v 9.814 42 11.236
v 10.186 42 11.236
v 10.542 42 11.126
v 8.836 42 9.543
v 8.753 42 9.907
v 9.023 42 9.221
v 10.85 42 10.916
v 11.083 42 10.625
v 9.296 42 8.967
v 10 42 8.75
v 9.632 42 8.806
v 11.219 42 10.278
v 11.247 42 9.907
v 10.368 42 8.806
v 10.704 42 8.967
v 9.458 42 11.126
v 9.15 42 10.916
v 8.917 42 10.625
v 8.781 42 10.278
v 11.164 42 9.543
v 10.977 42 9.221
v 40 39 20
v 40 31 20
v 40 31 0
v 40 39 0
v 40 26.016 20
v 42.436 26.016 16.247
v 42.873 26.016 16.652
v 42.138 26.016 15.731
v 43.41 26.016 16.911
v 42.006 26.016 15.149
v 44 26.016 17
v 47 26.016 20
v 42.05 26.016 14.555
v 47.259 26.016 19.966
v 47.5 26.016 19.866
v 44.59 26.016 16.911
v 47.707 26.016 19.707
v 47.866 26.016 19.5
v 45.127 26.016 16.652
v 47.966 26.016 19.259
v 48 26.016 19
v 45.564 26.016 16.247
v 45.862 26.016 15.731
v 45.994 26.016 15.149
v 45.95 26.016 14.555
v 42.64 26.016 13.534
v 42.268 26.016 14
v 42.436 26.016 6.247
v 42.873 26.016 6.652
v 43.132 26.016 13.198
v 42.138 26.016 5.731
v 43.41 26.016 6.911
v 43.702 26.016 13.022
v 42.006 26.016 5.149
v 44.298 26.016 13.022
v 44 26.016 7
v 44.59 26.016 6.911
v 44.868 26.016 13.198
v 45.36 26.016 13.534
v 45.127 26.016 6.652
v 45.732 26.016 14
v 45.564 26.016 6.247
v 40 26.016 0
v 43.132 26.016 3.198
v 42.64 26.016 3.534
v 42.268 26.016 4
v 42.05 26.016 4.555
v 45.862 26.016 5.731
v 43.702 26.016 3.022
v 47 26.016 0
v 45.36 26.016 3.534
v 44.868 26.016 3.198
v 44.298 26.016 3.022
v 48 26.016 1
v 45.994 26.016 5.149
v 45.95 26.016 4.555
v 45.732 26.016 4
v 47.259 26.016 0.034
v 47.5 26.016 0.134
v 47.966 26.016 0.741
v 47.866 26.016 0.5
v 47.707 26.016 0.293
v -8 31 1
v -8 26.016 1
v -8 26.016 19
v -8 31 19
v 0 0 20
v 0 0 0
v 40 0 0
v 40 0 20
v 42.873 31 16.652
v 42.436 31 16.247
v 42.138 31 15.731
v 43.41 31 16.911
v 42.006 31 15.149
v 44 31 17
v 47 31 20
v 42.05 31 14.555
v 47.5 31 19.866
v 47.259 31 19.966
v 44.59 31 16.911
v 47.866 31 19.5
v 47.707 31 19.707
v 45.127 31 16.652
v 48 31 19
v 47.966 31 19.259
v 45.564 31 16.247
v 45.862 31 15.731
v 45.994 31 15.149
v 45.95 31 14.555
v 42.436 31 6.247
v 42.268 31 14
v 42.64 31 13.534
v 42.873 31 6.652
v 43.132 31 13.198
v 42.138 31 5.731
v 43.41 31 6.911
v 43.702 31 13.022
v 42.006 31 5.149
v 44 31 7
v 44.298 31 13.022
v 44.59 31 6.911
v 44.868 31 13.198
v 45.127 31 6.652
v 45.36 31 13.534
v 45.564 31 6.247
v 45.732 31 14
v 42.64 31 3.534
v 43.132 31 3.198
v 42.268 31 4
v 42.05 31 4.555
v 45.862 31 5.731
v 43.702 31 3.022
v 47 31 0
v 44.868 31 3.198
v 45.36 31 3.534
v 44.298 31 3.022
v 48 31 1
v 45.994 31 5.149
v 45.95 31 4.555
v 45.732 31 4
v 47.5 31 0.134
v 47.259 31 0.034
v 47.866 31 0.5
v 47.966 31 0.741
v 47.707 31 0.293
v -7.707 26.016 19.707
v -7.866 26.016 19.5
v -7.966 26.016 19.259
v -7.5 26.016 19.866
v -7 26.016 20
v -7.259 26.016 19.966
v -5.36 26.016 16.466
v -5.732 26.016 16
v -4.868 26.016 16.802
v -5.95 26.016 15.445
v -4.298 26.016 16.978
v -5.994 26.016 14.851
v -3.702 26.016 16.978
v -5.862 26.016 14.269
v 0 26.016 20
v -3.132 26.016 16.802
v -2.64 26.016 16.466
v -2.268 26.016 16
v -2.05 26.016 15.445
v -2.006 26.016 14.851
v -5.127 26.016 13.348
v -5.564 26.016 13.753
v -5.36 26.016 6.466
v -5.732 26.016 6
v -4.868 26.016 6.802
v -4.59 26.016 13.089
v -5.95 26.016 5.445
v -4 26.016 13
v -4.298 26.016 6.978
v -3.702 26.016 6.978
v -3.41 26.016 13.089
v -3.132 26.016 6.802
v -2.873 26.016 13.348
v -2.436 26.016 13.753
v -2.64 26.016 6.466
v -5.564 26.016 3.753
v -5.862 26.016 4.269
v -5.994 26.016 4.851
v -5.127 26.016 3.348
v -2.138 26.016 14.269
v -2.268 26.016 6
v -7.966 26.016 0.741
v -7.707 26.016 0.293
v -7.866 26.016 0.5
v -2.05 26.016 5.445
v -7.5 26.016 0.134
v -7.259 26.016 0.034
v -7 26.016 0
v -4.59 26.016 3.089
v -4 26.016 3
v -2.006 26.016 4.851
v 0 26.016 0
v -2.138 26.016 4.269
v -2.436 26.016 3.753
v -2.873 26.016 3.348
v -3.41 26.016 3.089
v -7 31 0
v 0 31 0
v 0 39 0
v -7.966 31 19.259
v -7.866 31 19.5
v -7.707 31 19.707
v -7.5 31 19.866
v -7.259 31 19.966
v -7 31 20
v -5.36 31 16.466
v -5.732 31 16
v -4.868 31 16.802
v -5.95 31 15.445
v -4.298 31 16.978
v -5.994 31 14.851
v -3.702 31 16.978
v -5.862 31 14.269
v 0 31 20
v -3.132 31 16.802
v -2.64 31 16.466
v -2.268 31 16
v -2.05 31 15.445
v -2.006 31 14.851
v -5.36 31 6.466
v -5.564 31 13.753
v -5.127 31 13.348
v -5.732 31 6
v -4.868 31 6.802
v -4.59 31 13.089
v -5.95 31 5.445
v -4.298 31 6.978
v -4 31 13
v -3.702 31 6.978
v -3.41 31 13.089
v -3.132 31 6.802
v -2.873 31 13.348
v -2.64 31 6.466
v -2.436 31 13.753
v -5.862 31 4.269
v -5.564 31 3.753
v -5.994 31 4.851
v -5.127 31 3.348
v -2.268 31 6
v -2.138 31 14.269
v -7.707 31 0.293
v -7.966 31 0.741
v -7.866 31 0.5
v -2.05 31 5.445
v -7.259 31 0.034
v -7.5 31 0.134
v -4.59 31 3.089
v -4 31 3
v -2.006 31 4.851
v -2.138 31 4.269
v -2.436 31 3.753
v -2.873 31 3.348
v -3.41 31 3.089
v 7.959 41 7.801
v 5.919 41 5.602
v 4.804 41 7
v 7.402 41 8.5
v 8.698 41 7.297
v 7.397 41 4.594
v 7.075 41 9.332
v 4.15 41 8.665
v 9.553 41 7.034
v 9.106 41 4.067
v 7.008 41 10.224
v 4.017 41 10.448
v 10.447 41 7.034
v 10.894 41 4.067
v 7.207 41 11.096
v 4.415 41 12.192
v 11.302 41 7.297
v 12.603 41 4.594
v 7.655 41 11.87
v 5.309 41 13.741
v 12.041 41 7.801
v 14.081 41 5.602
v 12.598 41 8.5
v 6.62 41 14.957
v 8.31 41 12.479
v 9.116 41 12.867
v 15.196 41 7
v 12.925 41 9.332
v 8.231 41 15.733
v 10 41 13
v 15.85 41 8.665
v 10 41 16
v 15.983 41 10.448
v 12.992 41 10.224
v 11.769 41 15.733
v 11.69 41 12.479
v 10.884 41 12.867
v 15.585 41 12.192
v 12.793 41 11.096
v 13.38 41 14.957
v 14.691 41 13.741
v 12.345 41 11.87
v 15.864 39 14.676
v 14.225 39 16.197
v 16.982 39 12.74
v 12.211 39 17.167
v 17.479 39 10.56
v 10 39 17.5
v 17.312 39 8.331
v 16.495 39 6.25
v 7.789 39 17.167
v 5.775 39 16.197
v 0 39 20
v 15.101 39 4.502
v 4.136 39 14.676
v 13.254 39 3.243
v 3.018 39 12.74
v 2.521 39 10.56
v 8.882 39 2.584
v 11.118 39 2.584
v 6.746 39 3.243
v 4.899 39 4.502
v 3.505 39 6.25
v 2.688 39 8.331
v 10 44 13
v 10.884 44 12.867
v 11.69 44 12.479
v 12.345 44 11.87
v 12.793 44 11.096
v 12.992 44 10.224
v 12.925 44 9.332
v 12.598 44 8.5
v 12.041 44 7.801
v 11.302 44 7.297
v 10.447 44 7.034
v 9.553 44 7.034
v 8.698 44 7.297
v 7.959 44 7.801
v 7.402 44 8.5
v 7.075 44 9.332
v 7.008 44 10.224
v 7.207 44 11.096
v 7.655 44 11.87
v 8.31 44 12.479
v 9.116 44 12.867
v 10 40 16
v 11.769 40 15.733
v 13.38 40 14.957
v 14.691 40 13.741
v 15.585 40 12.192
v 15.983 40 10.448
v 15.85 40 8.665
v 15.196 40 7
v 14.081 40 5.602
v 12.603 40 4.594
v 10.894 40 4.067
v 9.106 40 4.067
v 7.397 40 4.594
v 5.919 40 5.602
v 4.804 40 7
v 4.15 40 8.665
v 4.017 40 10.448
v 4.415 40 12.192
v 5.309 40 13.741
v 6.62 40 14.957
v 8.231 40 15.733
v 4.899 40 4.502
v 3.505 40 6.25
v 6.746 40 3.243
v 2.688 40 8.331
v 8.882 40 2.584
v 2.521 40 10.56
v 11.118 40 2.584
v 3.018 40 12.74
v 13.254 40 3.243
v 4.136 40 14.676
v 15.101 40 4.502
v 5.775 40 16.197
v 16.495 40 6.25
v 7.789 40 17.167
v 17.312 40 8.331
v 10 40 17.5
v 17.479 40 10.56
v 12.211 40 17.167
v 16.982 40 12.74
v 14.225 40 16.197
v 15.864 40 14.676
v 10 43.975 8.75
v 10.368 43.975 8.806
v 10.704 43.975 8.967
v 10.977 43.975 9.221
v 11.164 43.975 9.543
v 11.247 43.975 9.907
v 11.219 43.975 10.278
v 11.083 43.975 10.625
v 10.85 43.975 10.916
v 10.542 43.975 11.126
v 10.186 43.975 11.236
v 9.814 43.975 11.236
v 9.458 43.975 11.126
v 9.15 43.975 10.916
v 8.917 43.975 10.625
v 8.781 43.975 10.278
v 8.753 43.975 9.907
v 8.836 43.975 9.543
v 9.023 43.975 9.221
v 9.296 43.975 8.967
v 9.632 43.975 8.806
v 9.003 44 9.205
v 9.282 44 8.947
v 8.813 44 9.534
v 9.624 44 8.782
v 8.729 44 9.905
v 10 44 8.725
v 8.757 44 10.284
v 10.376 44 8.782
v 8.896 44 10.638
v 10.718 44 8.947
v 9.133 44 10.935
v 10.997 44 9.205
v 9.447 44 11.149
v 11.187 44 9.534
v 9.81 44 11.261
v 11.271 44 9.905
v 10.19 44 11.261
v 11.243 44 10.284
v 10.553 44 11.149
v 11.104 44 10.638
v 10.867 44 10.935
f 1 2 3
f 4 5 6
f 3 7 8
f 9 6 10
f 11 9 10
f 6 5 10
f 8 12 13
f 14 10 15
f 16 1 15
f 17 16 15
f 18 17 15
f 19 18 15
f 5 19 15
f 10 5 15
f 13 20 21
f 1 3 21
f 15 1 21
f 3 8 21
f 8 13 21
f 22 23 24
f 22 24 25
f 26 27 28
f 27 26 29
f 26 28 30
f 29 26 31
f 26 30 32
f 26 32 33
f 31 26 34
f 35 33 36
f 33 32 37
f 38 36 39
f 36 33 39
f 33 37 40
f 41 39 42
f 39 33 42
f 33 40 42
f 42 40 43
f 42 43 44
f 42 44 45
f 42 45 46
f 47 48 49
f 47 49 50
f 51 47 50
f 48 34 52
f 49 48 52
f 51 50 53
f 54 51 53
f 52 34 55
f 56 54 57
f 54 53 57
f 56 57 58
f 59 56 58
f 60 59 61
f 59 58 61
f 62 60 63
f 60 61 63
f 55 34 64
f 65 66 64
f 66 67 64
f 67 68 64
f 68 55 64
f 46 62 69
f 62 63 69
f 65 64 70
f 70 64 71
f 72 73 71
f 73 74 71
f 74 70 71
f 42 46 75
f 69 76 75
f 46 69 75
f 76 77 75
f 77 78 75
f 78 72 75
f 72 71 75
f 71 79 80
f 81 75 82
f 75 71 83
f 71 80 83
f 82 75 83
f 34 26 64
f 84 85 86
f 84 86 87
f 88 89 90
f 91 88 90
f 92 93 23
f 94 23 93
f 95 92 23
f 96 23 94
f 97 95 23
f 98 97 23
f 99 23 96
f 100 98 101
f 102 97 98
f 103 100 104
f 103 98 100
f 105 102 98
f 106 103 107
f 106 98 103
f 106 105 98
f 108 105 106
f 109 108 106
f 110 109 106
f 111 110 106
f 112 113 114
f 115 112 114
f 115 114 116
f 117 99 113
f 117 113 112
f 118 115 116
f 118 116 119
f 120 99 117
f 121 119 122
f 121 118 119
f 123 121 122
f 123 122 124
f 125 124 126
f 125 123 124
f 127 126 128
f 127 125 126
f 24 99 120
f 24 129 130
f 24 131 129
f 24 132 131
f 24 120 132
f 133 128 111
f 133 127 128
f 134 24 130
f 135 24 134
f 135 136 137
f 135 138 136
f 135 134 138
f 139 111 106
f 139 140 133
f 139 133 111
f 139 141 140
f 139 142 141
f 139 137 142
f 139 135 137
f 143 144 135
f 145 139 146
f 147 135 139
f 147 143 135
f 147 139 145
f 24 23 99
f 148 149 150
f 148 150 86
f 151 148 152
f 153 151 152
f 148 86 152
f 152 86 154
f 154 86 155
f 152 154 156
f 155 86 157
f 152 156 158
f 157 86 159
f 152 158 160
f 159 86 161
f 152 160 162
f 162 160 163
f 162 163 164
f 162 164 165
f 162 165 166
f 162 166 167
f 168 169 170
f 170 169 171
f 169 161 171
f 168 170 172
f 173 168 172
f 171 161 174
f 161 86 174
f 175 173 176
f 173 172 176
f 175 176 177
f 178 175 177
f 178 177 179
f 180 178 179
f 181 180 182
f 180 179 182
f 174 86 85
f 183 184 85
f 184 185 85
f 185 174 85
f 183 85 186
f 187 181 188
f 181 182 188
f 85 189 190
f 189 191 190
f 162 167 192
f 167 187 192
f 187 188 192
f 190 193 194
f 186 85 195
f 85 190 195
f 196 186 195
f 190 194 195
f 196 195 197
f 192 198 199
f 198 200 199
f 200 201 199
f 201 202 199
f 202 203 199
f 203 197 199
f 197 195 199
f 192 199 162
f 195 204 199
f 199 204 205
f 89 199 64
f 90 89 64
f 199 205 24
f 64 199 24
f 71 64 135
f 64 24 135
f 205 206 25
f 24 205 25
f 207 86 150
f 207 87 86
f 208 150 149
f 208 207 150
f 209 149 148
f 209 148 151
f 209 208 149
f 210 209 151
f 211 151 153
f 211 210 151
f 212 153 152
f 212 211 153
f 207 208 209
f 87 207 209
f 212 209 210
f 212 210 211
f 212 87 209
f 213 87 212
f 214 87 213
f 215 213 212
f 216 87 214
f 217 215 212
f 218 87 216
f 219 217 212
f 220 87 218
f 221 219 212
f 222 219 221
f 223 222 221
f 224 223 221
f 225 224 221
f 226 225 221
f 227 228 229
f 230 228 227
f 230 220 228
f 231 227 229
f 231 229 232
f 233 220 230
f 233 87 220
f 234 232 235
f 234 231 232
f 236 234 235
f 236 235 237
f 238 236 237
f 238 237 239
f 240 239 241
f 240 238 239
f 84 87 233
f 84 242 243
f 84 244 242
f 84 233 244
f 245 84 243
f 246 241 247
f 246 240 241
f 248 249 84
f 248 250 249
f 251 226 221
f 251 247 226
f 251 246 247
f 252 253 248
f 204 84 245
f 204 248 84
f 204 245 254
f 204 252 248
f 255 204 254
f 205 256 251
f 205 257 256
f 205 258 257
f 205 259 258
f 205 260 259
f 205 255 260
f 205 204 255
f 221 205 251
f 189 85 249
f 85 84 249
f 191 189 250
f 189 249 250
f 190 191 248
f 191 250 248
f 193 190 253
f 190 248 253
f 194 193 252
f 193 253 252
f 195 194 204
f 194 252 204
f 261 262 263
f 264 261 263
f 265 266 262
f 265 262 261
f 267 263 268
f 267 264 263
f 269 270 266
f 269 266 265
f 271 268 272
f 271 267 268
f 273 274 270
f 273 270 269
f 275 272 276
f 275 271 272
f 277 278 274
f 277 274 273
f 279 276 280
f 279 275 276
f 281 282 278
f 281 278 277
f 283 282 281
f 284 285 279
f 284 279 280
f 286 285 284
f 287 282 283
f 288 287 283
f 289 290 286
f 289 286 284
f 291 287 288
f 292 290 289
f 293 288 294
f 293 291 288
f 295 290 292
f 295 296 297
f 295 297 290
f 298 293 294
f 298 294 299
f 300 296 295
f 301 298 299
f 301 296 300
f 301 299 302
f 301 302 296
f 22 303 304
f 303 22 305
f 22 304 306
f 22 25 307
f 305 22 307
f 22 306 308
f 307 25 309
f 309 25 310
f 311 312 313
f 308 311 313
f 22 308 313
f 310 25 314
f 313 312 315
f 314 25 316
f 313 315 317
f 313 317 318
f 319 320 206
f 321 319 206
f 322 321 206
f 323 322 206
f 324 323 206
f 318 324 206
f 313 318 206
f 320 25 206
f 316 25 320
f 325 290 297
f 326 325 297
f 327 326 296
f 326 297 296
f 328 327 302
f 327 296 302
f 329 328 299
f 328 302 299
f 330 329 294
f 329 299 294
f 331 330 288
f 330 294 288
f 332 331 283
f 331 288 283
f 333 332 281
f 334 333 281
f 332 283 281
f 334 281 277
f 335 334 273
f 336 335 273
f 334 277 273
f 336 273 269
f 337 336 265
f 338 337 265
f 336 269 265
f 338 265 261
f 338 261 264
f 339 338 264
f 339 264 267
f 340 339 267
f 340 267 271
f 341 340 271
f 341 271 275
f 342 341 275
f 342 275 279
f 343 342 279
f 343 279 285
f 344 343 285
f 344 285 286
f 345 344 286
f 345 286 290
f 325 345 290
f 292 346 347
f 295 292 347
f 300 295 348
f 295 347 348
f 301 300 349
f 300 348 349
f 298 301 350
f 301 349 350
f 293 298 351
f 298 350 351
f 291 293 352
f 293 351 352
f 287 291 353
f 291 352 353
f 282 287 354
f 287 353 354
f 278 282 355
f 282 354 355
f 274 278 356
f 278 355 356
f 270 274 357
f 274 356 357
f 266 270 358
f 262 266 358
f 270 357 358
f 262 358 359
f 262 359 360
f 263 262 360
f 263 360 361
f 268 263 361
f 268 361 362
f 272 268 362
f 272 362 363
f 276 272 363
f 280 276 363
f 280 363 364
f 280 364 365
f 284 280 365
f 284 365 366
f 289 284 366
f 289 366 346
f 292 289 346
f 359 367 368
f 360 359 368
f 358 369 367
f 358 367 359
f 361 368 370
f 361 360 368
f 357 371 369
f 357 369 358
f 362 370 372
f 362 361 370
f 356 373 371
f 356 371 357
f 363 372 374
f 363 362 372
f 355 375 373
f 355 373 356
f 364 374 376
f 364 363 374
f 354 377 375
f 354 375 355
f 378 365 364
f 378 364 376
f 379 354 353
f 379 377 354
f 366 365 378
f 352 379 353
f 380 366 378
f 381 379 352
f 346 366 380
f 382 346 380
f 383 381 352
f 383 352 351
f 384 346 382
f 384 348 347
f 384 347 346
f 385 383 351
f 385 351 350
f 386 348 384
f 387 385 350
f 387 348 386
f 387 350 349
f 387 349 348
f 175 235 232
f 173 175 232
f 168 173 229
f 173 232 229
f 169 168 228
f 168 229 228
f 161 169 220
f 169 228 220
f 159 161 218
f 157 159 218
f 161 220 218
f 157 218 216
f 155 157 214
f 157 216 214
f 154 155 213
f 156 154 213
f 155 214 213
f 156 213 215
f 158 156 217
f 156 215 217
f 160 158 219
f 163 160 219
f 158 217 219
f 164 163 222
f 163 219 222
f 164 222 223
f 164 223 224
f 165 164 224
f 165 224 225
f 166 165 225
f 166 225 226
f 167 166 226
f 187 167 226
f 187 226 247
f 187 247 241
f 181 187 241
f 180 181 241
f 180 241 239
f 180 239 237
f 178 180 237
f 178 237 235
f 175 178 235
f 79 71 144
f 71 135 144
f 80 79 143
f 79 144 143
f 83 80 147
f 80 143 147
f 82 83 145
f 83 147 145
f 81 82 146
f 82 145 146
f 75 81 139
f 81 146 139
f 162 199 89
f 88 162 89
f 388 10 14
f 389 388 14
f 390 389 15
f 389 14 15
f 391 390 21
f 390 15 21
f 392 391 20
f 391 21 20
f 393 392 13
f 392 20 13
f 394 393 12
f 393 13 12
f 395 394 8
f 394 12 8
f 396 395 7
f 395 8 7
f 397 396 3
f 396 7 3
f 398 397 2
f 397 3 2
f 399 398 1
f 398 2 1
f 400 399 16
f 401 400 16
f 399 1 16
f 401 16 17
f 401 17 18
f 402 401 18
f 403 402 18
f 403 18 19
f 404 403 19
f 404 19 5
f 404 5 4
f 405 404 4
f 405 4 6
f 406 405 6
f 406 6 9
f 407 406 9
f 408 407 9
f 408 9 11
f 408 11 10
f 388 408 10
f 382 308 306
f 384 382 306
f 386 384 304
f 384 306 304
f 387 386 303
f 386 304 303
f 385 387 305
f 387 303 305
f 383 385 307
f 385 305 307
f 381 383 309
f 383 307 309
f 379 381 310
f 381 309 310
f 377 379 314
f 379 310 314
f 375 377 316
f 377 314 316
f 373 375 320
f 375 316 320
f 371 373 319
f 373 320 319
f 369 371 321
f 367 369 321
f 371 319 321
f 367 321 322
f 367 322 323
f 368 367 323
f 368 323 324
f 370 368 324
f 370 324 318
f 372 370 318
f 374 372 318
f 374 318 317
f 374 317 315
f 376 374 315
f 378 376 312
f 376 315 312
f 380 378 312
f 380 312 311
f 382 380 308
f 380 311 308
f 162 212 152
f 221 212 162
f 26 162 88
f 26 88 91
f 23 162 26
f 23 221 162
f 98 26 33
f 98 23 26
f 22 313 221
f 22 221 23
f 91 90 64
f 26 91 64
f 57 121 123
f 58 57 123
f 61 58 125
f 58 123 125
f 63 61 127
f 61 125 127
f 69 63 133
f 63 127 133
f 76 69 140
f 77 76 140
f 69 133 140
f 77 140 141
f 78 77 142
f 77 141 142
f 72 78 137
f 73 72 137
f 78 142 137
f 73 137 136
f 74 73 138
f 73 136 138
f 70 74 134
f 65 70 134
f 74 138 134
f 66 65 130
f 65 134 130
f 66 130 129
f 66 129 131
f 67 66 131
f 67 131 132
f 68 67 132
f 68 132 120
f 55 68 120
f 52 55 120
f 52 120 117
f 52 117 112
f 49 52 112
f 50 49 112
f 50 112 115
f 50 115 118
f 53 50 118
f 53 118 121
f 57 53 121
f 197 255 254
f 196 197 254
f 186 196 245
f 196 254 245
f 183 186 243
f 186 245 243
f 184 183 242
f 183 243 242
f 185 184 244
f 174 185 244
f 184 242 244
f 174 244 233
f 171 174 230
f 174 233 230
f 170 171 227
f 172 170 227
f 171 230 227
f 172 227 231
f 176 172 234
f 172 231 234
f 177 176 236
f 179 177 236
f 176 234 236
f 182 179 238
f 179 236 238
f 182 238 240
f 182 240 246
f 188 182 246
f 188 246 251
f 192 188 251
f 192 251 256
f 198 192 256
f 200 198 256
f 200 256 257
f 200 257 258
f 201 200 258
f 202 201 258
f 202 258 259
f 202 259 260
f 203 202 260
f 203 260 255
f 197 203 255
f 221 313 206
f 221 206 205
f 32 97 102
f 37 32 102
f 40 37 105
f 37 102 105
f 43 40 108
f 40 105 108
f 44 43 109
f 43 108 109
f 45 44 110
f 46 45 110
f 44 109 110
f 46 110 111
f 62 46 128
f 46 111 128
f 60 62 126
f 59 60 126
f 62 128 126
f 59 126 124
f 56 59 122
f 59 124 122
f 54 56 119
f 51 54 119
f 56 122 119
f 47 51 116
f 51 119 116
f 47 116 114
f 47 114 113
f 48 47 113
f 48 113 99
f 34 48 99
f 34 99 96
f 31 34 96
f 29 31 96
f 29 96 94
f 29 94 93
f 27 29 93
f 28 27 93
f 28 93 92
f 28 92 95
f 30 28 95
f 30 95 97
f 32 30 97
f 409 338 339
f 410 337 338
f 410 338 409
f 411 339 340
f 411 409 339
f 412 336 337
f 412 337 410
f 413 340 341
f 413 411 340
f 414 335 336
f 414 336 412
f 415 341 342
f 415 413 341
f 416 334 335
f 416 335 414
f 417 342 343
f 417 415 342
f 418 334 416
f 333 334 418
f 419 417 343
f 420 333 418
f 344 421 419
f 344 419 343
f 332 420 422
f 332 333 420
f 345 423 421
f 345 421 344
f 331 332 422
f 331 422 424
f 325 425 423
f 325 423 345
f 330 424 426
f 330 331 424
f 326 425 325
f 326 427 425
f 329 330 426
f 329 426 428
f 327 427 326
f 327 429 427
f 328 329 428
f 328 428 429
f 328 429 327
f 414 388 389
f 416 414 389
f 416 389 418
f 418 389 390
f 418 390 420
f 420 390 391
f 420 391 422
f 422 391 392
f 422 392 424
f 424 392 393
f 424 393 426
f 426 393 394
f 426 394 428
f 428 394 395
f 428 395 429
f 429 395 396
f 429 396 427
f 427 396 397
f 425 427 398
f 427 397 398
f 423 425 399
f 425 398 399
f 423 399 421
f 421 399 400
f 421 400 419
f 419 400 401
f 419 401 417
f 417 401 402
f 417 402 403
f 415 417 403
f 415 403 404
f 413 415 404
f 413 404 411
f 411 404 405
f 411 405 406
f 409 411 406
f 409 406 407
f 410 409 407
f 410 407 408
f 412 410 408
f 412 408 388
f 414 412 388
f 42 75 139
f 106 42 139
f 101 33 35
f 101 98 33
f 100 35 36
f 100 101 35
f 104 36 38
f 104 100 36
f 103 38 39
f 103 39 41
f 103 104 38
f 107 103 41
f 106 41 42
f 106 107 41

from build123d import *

# Parameters (mm, degrees)
EXTRUDE_1_DEPTH              = 20
SKETCH_2_R                   = 2
CUT_EXTRUDE_1_DEPTH          = 20
SKETCH_2_3_R                 = 2
CUT_EXTRUDE_2_DEPTH          = 20
SKETCH_2_4_R                 = 7.5
EXTRUDE_2_DEPTH              = 1
SKETCH_2_5_R                 = 6
EXTRUDE_3_DEPTH              = 2
SKETCH_2_6_R                 = 3
EXTRUDE_4_DEPTH              = 5
HOLE_WIZARD_M3_2_D           = 2.5
HOLE_WIZARD_M3_2_DEPTH       = 2
HOLE_WIZARD_M3_2_CSINK_D     = 2.55
HOLE_WIZARD_M3_2_CSINK_ANGLE = 90
FILLET_1_R                   = 1
FILLET_2_R                   = 1


with BuildPart() as part:
    # 草图1 → 凸台-拉伸1 (new body)
    with BuildSketch(Plane.XY):
        Polygon((40, 39), (0, 39), (0, 31), (-8, 31), (-8, 26.015576324), (0, 26.015576324), (0, 0), (40, 0), (40, 26.015576324), (48, 26.015576324), (48, 31), (40, 31), align=None)
    extrude(amount=EXTRUDE_1_DEPTH)

    # 草图2 → 切除-拉伸1 (cut)
    with BuildSketch(Plane(origin=(0, 39, 0), x_dir=(1, 0, 0), z_dir=(0, 1, 0))):
        with Locations((-4, -15)):
            Circle(SKETCH_2_R)
    extrude(amount=-CUT_EXTRUDE_1_DEPTH, mode=Mode.SUBTRACT)

    # 草图2<3> → 切除-拉伸2 (cut)
    with BuildSketch(Plane(origin=(0, 39, 0), x_dir=(1, 0, 0), z_dir=(0, 1, 0))):
        with Locations((-4, -5)):
            Circle(SKETCH_2_3_R)
        with Locations((44, -5)):
            Circle(SKETCH_2_3_R)
        with Locations((44, -15)):
            Circle(SKETCH_2_3_R)
    extrude(amount=-CUT_EXTRUDE_2_DEPTH, mode=Mode.SUBTRACT)

    # 草图2<4> → 凸台-拉伸2 (add)
    with BuildSketch(Plane(origin=(0, 39, 0), x_dir=(1, 0, 0), z_dir=(0, 1, 0))):
        with Locations((10, -10)):
            Circle(SKETCH_2_4_R)
    extrude(amount=EXTRUDE_2_DEPTH)

    # 草图2<5> → 凸台-拉伸3 (add)
    with BuildSketch(Plane(origin=(0, 39, 0), x_dir=(1, 0, 0), z_dir=(0, 1, 0))):
        with Locations((10, -10)):
            Circle(SKETCH_2_5_R)
    extrude(amount=EXTRUDE_3_DEPTH)

    # 草图2<6> → 凸台-拉伸4 (add)
    with BuildSketch(Plane(origin=(0, 39, 0), x_dir=(1, 0, 0), z_dir=(0, 1, 0))):
        with Locations((10, -10)):
            Circle(SKETCH_2_6_R)
    extrude(amount=EXTRUDE_4_DEPTH)

    # M3 螺纹孔的螺纹孔钻头2
    with Locations(Plane(origin=(10, 44, 10), x_dir=(0, 0, 1), z_dir=(0, 1, 0))):
        with Locations((0, 0)):
            CounterSinkHole(HOLE_WIZARD_M3_2_D / 2, HOLE_WIZARD_M3_2_CSINK_D / 2, depth=HOLE_WIZARD_M3_2_DEPTH, counter_sink_angle=HOLE_WIZARD_M3_2_CSINK_ANGLE)

    # 圆角1
    fillet_1_edges = [part.edges().sort_by_distance(p)[0] for p in [
        (-8, 28.507788162, 20),
    ]]
    fillet(fillet_1_edges, radius=FILLET_1_R)

    # 圆角2
    fillet_2_edges = [part.edges().sort_by_distance(p)[0] for p in [
        (-8, 28.507788162, 0),
        (48, 28.507788162, 0),
        (48, 28.507788162, 20),
    ]]
    fillet(fillet_2_edges, radius=FILLET_2_R)


solid = part.part
